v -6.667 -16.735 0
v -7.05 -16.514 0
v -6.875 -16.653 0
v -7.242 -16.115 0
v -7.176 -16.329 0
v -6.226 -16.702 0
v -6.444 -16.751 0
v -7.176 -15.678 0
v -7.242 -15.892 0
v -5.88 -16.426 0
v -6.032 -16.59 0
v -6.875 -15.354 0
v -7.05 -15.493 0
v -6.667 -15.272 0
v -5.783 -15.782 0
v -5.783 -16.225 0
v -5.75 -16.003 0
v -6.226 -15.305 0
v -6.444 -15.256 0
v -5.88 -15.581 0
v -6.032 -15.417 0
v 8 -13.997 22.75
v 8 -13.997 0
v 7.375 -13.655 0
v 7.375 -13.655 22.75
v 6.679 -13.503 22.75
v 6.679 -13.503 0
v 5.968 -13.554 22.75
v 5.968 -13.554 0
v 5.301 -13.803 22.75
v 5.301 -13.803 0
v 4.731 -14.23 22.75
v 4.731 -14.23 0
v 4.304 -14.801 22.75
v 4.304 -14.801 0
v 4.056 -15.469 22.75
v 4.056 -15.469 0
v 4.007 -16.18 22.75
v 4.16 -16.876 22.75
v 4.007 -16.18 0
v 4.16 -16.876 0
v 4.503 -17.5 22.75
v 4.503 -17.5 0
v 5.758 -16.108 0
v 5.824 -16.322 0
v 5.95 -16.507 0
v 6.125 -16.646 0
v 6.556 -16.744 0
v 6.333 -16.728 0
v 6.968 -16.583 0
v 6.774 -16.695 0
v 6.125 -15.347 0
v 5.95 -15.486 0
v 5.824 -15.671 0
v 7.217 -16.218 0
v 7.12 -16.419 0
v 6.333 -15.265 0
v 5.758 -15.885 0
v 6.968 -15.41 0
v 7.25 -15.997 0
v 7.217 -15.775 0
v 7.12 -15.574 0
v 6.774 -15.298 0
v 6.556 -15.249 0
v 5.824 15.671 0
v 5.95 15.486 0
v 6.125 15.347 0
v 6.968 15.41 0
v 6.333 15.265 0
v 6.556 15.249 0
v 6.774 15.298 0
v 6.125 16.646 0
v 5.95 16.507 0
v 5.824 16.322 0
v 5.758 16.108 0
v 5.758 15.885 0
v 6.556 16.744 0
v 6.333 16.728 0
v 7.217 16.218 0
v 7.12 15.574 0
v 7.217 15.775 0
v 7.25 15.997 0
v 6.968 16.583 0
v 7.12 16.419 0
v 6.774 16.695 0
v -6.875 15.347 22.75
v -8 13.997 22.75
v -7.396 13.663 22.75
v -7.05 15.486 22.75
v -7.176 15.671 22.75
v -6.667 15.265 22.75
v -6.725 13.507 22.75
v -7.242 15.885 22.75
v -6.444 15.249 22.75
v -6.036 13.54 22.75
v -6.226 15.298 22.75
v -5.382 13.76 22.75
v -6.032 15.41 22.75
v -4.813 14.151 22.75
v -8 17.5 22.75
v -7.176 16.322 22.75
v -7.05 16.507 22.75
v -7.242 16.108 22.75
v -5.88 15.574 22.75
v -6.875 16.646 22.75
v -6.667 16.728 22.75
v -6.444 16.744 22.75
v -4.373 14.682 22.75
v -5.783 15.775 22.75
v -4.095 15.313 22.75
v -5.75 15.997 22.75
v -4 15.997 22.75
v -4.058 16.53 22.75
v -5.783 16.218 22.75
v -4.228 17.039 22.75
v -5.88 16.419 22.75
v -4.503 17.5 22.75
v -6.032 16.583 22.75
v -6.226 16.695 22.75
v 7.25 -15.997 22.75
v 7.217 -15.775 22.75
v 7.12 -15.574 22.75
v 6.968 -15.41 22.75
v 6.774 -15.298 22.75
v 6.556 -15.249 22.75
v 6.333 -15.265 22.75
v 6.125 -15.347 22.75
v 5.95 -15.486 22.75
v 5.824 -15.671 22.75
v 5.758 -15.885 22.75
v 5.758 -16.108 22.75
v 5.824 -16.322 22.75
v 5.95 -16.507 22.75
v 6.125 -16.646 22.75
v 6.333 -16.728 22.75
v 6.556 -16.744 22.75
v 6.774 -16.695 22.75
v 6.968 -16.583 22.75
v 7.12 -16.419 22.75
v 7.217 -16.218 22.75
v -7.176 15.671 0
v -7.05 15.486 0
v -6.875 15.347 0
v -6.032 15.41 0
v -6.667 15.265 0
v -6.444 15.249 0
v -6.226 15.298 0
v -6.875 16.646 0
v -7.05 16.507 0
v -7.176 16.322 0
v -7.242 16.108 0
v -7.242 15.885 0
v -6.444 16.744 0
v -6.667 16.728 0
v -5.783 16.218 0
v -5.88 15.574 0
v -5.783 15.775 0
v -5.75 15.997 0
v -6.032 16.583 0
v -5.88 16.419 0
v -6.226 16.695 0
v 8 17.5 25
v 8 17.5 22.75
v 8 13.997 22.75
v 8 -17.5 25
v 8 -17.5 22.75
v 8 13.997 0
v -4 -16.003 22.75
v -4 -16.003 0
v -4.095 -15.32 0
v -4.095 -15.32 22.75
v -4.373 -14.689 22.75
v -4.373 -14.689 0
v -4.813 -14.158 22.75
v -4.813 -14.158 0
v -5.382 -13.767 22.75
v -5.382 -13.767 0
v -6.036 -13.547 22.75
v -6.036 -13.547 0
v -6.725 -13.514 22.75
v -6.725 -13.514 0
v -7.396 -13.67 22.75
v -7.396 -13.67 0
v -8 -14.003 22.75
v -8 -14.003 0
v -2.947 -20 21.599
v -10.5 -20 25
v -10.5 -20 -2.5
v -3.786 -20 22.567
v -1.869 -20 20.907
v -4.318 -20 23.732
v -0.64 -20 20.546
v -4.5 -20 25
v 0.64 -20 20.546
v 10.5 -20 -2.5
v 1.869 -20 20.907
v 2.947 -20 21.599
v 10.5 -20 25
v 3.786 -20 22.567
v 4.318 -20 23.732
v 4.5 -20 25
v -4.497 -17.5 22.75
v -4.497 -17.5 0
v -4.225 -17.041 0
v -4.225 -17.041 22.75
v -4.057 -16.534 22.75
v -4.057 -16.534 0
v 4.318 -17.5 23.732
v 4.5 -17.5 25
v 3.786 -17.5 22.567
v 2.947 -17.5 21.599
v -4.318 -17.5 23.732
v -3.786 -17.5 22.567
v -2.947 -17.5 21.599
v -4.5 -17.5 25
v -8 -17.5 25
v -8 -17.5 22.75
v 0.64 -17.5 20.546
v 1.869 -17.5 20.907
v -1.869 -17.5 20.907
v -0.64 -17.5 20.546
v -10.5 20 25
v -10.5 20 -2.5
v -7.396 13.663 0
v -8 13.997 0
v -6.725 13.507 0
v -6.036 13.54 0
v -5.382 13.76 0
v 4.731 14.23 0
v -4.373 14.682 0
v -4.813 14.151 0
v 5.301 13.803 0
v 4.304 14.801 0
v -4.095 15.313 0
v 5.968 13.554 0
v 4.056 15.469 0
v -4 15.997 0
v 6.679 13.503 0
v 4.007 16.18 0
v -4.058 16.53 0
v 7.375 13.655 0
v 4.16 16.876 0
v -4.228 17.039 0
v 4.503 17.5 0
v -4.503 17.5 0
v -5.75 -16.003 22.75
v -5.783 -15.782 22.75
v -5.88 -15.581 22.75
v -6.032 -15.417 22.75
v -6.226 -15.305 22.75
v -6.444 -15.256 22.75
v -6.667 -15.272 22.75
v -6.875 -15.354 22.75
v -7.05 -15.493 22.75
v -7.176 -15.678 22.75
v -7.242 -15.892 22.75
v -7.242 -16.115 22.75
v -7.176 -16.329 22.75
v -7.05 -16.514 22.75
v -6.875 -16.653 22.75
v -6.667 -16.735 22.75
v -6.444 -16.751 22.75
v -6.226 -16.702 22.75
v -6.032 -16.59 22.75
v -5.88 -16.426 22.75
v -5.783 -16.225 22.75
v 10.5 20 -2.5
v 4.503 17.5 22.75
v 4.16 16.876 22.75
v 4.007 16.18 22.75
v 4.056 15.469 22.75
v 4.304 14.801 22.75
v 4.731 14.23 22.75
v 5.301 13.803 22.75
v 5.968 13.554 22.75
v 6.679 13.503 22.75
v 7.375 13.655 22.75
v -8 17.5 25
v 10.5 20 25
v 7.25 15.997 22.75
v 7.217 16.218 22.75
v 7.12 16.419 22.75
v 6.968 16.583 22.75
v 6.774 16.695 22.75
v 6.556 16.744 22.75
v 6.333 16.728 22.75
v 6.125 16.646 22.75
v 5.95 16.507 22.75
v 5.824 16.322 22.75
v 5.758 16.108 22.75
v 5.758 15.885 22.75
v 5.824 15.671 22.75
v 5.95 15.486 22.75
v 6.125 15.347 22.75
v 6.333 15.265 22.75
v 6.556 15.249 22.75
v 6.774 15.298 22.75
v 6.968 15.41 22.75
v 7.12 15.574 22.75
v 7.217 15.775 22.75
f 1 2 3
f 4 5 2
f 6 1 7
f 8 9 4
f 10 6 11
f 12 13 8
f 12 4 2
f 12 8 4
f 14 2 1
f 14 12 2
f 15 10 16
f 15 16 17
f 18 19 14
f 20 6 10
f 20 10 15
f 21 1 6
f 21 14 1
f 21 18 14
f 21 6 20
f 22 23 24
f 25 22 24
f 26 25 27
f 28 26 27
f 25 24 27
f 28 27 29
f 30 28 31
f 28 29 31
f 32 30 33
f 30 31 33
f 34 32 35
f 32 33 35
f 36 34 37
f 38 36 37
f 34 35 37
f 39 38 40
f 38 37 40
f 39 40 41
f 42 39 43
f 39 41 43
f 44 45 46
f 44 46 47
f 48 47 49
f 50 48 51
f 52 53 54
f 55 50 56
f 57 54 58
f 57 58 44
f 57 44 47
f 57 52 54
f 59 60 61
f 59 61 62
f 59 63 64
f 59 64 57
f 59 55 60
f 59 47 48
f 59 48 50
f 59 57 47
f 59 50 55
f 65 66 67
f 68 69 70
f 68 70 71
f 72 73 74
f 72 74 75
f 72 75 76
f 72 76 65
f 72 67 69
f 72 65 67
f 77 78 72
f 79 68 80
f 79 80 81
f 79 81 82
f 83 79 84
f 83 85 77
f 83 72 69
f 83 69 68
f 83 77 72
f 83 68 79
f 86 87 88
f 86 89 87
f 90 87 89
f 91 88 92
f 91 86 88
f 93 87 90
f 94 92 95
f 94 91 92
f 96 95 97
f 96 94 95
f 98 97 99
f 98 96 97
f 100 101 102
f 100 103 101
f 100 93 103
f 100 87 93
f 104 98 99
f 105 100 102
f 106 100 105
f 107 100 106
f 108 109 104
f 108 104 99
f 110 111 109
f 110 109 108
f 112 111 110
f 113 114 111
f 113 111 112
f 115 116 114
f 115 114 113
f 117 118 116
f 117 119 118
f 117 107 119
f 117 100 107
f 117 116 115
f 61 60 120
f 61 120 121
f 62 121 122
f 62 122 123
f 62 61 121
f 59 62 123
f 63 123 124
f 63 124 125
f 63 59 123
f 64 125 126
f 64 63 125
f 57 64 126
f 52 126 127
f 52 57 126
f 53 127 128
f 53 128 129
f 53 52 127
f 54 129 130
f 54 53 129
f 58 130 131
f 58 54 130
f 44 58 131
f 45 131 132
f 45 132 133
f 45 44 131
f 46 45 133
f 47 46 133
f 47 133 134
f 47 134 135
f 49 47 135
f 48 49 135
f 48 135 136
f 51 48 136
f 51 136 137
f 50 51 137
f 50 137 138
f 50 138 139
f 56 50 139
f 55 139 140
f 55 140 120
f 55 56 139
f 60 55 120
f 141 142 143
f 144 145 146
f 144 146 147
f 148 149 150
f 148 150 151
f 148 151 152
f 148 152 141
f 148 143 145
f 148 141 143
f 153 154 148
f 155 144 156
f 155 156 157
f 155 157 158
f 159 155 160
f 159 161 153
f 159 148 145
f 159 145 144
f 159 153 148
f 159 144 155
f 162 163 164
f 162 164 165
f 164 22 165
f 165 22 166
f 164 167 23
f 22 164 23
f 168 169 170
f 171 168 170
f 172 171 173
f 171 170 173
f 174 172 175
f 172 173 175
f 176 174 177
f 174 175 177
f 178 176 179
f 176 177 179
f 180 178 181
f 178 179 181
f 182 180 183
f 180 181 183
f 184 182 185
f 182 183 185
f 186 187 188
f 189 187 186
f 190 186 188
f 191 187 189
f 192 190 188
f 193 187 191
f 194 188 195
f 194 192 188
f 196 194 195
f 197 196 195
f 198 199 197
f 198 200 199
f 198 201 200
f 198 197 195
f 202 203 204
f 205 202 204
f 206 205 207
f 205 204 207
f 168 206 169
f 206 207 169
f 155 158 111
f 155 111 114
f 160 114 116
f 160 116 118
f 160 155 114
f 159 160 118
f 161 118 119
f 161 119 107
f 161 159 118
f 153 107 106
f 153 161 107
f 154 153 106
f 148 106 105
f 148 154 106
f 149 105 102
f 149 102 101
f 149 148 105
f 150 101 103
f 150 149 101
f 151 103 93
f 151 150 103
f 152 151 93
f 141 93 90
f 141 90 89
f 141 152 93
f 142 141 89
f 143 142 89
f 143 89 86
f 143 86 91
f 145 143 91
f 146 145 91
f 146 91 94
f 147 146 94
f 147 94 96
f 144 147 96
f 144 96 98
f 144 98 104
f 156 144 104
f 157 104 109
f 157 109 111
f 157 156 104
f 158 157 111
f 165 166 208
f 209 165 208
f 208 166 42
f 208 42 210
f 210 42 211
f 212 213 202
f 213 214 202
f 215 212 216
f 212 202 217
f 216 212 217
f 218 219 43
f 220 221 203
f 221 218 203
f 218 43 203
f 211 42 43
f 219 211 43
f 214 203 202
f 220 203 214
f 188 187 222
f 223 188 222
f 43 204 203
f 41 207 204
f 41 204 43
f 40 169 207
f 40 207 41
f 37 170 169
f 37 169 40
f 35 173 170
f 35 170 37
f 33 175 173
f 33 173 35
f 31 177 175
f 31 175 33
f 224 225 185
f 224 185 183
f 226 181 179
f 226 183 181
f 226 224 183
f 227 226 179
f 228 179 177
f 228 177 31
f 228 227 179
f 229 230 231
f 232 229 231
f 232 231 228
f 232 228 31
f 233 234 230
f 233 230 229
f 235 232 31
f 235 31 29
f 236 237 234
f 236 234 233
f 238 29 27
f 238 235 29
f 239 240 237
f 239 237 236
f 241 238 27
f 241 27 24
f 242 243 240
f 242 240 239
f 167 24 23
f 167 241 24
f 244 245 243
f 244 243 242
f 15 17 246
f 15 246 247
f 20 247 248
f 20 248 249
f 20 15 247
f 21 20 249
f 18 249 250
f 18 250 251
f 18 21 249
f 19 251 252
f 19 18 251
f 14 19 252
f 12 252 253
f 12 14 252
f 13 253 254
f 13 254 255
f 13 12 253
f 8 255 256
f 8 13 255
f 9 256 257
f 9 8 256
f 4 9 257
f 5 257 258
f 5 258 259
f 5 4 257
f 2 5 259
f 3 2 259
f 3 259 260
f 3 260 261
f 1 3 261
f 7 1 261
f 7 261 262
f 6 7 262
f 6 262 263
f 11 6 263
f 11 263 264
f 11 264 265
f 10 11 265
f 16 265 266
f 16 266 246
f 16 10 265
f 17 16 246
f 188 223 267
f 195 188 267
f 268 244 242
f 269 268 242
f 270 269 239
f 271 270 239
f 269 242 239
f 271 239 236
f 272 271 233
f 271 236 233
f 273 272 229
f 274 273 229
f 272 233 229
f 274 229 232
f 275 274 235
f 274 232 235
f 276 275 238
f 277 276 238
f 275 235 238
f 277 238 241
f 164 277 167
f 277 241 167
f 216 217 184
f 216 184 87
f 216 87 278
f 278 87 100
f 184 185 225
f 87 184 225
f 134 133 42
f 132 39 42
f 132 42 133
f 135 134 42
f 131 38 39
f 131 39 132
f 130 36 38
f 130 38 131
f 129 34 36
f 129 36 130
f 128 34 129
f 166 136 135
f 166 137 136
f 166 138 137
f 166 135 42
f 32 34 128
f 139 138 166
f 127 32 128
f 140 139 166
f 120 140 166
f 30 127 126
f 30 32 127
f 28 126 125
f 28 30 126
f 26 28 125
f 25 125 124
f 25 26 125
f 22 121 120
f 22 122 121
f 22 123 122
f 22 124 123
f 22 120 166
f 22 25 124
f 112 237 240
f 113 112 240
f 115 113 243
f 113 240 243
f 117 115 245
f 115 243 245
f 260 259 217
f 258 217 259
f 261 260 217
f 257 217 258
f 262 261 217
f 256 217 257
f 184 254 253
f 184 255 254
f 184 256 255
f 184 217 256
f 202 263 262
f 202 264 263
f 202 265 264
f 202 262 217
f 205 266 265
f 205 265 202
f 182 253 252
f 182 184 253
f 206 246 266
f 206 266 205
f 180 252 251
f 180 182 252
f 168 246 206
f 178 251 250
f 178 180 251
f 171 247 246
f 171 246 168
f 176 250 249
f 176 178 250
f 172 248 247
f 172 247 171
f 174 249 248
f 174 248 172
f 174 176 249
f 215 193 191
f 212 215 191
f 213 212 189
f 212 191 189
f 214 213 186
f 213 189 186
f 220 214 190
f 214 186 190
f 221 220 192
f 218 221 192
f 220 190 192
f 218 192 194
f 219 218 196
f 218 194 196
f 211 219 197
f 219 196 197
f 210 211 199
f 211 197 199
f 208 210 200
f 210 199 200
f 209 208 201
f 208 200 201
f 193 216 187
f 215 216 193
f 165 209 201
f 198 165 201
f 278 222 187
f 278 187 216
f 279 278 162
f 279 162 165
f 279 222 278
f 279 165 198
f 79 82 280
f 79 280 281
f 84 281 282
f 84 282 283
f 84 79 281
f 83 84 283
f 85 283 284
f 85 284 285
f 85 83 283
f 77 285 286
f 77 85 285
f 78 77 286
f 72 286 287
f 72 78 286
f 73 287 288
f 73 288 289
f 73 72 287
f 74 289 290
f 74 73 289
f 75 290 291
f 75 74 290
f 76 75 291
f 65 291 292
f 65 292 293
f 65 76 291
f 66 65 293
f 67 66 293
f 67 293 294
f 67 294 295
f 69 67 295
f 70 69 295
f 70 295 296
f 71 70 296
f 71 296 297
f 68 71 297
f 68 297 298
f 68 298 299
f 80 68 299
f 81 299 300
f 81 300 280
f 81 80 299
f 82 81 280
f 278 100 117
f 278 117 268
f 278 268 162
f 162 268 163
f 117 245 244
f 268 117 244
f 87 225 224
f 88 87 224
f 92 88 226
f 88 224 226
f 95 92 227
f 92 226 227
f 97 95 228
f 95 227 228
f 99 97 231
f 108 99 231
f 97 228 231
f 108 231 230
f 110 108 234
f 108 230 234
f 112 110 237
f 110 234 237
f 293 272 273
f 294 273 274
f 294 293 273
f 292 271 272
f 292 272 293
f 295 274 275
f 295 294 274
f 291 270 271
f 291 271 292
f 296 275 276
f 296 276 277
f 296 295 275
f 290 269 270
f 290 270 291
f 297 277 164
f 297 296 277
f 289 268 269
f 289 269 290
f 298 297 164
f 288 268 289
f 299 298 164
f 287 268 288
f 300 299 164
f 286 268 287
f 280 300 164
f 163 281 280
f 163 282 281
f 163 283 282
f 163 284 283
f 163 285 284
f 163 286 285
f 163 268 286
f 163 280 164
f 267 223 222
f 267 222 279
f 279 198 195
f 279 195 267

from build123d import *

# Parameters (mm, degrees)
F0_W     = 21
F0_H     = 40
F1_DEPTH = 25
F0_R     = 0.75
F2_DEPTH = 22.75
F3_W     = 21
F3_H     = 40
F4_DEPTH = 2.5
F5_R     = 4.5
F6_DEPTH = 2.5


# Not quite as in the source:
# - a feature names something its author has since deleted; it is built from what else it names


with BuildPart() as f1:
    # F0 (on Top) → F1 (new body)
    with BuildSketch(Plane.XY):
        Rectangle(F0_W, F0_H)
        with BuildLine():
            ThreePointArc((-8, 13.996502206), (-8.2693131131, 17.7627216453), (-4.5026281309, 17.5))
            Line((-4.5026281309, 17.5), (4.5026281309, 17.5))
            ThreePointArc((4.5026281309, 17.5), (7.2926444119, 18.3675177766), (9, 15.996502206))
            ThreePointArc((9, 15.996502206), (8.7360679775, 14.8784682172), (8, 13.996502206))
            Line((8, 13.996502206), (8, -13.9965024172))
            ThreePointArc((8, -13.9965024172), (8.7360679775, -14.8784684285), (9, -15.9965024172))
            ThreePointArc((9, -15.9965024172), (7.2926442865, -18.3675180298), (4.5026279719, -17.5))
            Line((4.5026279719, -17.5), (-4.4973814273, -17.5))
            ThreePointArc((-4.4973814273, -17.5), (-8.2662214687, -17.7728088813), (-8, -14.003497794))
            Line((-8, -14.003497794), (-8, 13.996502206))
        make_face(mode=Mode.SUBTRACT)
        with BuildLine():
            Line((-8, -17.5), (-8, -14.003497794))
            ThreePointArc((-8, -14.003497794), (-8.2662214687, -17.7728088813), (-4.4973814273, -17.5))
            Line((-4.4973814273, -17.5), (-8, -17.5))
        make_face()
        with BuildLine():
            Line((-8, 13.996502206), (-8, 17.5))
            Line((-8, 17.5), (-4.5026281309, 17.5))
            ThreePointArc((-4.5026281309, 17.5), (-8.2693131131, 17.7627216453), (-8, 13.996502206))
        make_face()
        with BuildLine():
            ThreePointArc((9, 15.996502206), (7.2926444119, 18.3675177766), (4.5026281309, 17.5))
            Line((4.5026281309, 17.5), (8, 17.5))
            Line((8, 17.5), (8, 13.996502206))
            ThreePointArc((8, 13.996502206), (8.7360679775, 14.8784682172), (9, 15.996502206))
        make_face()
        with BuildLine():
            ThreePointArc((9, -15.9965024172), (8.7360679775, -14.8784684285), (8, -13.9965024172))
            Line((8, -13.9965024172), (8, -17.5))
            Line((8, -17.5), (4.5026279719, -17.5))
            ThreePointArc((4.5026279719, -17.5), (7.2926442865, -18.3675180298), (9, -15.9965024172))
        make_face()
    extrude(amount=F1_DEPTH)

    # F0 (on Top) → F2 (join)
    with BuildSketch(Plane.XY):
        with BuildLine():
            Line((-4.5026281309, 17.5), (-8, 17.5))
            Line((-8, 17.5), (-8, 13.996502206))
            ThreePointArc((-8, 13.996502206), (-5.3819660113, 13.7604342285), (-4, 15.996502206))
            ThreePointArc((-4, 15.996502206), (-4.1289844293, 16.7891466178), (-4.5026281309, 17.5))
        make_face()
        with Locations((-6.5, 15.996502206)):
            Circle(F0_R, mode=Mode.SUBTRACT)
        with BuildLine():
            Line((8, 17.5), (4.5026281309, 17.5))
            ThreePointArc((4.5026281309, 17.5), (4.7306868869, 14.2302827667), (8, 13.996502206))
            Line((8, 13.996502206), (8, 17.5))
        make_face()
        with Locations((6.5, 15.996502206)):
            Circle(F0_R, mode=Mode.SUBTRACT)
        with BuildLine():
            Line((8, -17.5), (8, -13.9965024172))
            ThreePointArc((8, -13.9965024172), (4.7306869803, -14.2302828844), (4.5026279719, -17.5))
            Line((4.5026279719, -17.5), (8, -17.5))
        make_face()
        with Locations((6.5, -15.9965024172)):
            Circle(F0_R, mode=Mode.SUBTRACT)
        with BuildLine():
            ThreePointArc((-4, -16.003497794), (-5.3819660113, -13.7674298165), (-8, -14.003497794))
            Line((-8, -14.003497794), (-8, -17.5))
            Line((-8, -17.5), (-4.4973814273, -17.5))
            ThreePointArc((-4.4973814273, -17.5), (-4.1276018007, -16.7919943281), (-4, -16.003497794))
        make_face()
        with Locations((-6.5, -16.003497794)):
            Circle(F0_R, mode=Mode.SUBTRACT)
    extrude(amount=F2_DEPTH)

    # F3 (on face) → F4 (join)
    with BuildSketch(Plane.XY):
        Rectangle(F3_W, F3_H)
    extrude(amount=-F4_DEPTH)

    # F5 (on face) → F6 (cut)
    with BuildSketch(Plane.XZ.offset(20)):
        with Locations((0, 25)):
            Circle(F5_R)
    extrude(amount=-F6_DEPTH, mode=Mode.SUBTRACT)


solid = f1.part
